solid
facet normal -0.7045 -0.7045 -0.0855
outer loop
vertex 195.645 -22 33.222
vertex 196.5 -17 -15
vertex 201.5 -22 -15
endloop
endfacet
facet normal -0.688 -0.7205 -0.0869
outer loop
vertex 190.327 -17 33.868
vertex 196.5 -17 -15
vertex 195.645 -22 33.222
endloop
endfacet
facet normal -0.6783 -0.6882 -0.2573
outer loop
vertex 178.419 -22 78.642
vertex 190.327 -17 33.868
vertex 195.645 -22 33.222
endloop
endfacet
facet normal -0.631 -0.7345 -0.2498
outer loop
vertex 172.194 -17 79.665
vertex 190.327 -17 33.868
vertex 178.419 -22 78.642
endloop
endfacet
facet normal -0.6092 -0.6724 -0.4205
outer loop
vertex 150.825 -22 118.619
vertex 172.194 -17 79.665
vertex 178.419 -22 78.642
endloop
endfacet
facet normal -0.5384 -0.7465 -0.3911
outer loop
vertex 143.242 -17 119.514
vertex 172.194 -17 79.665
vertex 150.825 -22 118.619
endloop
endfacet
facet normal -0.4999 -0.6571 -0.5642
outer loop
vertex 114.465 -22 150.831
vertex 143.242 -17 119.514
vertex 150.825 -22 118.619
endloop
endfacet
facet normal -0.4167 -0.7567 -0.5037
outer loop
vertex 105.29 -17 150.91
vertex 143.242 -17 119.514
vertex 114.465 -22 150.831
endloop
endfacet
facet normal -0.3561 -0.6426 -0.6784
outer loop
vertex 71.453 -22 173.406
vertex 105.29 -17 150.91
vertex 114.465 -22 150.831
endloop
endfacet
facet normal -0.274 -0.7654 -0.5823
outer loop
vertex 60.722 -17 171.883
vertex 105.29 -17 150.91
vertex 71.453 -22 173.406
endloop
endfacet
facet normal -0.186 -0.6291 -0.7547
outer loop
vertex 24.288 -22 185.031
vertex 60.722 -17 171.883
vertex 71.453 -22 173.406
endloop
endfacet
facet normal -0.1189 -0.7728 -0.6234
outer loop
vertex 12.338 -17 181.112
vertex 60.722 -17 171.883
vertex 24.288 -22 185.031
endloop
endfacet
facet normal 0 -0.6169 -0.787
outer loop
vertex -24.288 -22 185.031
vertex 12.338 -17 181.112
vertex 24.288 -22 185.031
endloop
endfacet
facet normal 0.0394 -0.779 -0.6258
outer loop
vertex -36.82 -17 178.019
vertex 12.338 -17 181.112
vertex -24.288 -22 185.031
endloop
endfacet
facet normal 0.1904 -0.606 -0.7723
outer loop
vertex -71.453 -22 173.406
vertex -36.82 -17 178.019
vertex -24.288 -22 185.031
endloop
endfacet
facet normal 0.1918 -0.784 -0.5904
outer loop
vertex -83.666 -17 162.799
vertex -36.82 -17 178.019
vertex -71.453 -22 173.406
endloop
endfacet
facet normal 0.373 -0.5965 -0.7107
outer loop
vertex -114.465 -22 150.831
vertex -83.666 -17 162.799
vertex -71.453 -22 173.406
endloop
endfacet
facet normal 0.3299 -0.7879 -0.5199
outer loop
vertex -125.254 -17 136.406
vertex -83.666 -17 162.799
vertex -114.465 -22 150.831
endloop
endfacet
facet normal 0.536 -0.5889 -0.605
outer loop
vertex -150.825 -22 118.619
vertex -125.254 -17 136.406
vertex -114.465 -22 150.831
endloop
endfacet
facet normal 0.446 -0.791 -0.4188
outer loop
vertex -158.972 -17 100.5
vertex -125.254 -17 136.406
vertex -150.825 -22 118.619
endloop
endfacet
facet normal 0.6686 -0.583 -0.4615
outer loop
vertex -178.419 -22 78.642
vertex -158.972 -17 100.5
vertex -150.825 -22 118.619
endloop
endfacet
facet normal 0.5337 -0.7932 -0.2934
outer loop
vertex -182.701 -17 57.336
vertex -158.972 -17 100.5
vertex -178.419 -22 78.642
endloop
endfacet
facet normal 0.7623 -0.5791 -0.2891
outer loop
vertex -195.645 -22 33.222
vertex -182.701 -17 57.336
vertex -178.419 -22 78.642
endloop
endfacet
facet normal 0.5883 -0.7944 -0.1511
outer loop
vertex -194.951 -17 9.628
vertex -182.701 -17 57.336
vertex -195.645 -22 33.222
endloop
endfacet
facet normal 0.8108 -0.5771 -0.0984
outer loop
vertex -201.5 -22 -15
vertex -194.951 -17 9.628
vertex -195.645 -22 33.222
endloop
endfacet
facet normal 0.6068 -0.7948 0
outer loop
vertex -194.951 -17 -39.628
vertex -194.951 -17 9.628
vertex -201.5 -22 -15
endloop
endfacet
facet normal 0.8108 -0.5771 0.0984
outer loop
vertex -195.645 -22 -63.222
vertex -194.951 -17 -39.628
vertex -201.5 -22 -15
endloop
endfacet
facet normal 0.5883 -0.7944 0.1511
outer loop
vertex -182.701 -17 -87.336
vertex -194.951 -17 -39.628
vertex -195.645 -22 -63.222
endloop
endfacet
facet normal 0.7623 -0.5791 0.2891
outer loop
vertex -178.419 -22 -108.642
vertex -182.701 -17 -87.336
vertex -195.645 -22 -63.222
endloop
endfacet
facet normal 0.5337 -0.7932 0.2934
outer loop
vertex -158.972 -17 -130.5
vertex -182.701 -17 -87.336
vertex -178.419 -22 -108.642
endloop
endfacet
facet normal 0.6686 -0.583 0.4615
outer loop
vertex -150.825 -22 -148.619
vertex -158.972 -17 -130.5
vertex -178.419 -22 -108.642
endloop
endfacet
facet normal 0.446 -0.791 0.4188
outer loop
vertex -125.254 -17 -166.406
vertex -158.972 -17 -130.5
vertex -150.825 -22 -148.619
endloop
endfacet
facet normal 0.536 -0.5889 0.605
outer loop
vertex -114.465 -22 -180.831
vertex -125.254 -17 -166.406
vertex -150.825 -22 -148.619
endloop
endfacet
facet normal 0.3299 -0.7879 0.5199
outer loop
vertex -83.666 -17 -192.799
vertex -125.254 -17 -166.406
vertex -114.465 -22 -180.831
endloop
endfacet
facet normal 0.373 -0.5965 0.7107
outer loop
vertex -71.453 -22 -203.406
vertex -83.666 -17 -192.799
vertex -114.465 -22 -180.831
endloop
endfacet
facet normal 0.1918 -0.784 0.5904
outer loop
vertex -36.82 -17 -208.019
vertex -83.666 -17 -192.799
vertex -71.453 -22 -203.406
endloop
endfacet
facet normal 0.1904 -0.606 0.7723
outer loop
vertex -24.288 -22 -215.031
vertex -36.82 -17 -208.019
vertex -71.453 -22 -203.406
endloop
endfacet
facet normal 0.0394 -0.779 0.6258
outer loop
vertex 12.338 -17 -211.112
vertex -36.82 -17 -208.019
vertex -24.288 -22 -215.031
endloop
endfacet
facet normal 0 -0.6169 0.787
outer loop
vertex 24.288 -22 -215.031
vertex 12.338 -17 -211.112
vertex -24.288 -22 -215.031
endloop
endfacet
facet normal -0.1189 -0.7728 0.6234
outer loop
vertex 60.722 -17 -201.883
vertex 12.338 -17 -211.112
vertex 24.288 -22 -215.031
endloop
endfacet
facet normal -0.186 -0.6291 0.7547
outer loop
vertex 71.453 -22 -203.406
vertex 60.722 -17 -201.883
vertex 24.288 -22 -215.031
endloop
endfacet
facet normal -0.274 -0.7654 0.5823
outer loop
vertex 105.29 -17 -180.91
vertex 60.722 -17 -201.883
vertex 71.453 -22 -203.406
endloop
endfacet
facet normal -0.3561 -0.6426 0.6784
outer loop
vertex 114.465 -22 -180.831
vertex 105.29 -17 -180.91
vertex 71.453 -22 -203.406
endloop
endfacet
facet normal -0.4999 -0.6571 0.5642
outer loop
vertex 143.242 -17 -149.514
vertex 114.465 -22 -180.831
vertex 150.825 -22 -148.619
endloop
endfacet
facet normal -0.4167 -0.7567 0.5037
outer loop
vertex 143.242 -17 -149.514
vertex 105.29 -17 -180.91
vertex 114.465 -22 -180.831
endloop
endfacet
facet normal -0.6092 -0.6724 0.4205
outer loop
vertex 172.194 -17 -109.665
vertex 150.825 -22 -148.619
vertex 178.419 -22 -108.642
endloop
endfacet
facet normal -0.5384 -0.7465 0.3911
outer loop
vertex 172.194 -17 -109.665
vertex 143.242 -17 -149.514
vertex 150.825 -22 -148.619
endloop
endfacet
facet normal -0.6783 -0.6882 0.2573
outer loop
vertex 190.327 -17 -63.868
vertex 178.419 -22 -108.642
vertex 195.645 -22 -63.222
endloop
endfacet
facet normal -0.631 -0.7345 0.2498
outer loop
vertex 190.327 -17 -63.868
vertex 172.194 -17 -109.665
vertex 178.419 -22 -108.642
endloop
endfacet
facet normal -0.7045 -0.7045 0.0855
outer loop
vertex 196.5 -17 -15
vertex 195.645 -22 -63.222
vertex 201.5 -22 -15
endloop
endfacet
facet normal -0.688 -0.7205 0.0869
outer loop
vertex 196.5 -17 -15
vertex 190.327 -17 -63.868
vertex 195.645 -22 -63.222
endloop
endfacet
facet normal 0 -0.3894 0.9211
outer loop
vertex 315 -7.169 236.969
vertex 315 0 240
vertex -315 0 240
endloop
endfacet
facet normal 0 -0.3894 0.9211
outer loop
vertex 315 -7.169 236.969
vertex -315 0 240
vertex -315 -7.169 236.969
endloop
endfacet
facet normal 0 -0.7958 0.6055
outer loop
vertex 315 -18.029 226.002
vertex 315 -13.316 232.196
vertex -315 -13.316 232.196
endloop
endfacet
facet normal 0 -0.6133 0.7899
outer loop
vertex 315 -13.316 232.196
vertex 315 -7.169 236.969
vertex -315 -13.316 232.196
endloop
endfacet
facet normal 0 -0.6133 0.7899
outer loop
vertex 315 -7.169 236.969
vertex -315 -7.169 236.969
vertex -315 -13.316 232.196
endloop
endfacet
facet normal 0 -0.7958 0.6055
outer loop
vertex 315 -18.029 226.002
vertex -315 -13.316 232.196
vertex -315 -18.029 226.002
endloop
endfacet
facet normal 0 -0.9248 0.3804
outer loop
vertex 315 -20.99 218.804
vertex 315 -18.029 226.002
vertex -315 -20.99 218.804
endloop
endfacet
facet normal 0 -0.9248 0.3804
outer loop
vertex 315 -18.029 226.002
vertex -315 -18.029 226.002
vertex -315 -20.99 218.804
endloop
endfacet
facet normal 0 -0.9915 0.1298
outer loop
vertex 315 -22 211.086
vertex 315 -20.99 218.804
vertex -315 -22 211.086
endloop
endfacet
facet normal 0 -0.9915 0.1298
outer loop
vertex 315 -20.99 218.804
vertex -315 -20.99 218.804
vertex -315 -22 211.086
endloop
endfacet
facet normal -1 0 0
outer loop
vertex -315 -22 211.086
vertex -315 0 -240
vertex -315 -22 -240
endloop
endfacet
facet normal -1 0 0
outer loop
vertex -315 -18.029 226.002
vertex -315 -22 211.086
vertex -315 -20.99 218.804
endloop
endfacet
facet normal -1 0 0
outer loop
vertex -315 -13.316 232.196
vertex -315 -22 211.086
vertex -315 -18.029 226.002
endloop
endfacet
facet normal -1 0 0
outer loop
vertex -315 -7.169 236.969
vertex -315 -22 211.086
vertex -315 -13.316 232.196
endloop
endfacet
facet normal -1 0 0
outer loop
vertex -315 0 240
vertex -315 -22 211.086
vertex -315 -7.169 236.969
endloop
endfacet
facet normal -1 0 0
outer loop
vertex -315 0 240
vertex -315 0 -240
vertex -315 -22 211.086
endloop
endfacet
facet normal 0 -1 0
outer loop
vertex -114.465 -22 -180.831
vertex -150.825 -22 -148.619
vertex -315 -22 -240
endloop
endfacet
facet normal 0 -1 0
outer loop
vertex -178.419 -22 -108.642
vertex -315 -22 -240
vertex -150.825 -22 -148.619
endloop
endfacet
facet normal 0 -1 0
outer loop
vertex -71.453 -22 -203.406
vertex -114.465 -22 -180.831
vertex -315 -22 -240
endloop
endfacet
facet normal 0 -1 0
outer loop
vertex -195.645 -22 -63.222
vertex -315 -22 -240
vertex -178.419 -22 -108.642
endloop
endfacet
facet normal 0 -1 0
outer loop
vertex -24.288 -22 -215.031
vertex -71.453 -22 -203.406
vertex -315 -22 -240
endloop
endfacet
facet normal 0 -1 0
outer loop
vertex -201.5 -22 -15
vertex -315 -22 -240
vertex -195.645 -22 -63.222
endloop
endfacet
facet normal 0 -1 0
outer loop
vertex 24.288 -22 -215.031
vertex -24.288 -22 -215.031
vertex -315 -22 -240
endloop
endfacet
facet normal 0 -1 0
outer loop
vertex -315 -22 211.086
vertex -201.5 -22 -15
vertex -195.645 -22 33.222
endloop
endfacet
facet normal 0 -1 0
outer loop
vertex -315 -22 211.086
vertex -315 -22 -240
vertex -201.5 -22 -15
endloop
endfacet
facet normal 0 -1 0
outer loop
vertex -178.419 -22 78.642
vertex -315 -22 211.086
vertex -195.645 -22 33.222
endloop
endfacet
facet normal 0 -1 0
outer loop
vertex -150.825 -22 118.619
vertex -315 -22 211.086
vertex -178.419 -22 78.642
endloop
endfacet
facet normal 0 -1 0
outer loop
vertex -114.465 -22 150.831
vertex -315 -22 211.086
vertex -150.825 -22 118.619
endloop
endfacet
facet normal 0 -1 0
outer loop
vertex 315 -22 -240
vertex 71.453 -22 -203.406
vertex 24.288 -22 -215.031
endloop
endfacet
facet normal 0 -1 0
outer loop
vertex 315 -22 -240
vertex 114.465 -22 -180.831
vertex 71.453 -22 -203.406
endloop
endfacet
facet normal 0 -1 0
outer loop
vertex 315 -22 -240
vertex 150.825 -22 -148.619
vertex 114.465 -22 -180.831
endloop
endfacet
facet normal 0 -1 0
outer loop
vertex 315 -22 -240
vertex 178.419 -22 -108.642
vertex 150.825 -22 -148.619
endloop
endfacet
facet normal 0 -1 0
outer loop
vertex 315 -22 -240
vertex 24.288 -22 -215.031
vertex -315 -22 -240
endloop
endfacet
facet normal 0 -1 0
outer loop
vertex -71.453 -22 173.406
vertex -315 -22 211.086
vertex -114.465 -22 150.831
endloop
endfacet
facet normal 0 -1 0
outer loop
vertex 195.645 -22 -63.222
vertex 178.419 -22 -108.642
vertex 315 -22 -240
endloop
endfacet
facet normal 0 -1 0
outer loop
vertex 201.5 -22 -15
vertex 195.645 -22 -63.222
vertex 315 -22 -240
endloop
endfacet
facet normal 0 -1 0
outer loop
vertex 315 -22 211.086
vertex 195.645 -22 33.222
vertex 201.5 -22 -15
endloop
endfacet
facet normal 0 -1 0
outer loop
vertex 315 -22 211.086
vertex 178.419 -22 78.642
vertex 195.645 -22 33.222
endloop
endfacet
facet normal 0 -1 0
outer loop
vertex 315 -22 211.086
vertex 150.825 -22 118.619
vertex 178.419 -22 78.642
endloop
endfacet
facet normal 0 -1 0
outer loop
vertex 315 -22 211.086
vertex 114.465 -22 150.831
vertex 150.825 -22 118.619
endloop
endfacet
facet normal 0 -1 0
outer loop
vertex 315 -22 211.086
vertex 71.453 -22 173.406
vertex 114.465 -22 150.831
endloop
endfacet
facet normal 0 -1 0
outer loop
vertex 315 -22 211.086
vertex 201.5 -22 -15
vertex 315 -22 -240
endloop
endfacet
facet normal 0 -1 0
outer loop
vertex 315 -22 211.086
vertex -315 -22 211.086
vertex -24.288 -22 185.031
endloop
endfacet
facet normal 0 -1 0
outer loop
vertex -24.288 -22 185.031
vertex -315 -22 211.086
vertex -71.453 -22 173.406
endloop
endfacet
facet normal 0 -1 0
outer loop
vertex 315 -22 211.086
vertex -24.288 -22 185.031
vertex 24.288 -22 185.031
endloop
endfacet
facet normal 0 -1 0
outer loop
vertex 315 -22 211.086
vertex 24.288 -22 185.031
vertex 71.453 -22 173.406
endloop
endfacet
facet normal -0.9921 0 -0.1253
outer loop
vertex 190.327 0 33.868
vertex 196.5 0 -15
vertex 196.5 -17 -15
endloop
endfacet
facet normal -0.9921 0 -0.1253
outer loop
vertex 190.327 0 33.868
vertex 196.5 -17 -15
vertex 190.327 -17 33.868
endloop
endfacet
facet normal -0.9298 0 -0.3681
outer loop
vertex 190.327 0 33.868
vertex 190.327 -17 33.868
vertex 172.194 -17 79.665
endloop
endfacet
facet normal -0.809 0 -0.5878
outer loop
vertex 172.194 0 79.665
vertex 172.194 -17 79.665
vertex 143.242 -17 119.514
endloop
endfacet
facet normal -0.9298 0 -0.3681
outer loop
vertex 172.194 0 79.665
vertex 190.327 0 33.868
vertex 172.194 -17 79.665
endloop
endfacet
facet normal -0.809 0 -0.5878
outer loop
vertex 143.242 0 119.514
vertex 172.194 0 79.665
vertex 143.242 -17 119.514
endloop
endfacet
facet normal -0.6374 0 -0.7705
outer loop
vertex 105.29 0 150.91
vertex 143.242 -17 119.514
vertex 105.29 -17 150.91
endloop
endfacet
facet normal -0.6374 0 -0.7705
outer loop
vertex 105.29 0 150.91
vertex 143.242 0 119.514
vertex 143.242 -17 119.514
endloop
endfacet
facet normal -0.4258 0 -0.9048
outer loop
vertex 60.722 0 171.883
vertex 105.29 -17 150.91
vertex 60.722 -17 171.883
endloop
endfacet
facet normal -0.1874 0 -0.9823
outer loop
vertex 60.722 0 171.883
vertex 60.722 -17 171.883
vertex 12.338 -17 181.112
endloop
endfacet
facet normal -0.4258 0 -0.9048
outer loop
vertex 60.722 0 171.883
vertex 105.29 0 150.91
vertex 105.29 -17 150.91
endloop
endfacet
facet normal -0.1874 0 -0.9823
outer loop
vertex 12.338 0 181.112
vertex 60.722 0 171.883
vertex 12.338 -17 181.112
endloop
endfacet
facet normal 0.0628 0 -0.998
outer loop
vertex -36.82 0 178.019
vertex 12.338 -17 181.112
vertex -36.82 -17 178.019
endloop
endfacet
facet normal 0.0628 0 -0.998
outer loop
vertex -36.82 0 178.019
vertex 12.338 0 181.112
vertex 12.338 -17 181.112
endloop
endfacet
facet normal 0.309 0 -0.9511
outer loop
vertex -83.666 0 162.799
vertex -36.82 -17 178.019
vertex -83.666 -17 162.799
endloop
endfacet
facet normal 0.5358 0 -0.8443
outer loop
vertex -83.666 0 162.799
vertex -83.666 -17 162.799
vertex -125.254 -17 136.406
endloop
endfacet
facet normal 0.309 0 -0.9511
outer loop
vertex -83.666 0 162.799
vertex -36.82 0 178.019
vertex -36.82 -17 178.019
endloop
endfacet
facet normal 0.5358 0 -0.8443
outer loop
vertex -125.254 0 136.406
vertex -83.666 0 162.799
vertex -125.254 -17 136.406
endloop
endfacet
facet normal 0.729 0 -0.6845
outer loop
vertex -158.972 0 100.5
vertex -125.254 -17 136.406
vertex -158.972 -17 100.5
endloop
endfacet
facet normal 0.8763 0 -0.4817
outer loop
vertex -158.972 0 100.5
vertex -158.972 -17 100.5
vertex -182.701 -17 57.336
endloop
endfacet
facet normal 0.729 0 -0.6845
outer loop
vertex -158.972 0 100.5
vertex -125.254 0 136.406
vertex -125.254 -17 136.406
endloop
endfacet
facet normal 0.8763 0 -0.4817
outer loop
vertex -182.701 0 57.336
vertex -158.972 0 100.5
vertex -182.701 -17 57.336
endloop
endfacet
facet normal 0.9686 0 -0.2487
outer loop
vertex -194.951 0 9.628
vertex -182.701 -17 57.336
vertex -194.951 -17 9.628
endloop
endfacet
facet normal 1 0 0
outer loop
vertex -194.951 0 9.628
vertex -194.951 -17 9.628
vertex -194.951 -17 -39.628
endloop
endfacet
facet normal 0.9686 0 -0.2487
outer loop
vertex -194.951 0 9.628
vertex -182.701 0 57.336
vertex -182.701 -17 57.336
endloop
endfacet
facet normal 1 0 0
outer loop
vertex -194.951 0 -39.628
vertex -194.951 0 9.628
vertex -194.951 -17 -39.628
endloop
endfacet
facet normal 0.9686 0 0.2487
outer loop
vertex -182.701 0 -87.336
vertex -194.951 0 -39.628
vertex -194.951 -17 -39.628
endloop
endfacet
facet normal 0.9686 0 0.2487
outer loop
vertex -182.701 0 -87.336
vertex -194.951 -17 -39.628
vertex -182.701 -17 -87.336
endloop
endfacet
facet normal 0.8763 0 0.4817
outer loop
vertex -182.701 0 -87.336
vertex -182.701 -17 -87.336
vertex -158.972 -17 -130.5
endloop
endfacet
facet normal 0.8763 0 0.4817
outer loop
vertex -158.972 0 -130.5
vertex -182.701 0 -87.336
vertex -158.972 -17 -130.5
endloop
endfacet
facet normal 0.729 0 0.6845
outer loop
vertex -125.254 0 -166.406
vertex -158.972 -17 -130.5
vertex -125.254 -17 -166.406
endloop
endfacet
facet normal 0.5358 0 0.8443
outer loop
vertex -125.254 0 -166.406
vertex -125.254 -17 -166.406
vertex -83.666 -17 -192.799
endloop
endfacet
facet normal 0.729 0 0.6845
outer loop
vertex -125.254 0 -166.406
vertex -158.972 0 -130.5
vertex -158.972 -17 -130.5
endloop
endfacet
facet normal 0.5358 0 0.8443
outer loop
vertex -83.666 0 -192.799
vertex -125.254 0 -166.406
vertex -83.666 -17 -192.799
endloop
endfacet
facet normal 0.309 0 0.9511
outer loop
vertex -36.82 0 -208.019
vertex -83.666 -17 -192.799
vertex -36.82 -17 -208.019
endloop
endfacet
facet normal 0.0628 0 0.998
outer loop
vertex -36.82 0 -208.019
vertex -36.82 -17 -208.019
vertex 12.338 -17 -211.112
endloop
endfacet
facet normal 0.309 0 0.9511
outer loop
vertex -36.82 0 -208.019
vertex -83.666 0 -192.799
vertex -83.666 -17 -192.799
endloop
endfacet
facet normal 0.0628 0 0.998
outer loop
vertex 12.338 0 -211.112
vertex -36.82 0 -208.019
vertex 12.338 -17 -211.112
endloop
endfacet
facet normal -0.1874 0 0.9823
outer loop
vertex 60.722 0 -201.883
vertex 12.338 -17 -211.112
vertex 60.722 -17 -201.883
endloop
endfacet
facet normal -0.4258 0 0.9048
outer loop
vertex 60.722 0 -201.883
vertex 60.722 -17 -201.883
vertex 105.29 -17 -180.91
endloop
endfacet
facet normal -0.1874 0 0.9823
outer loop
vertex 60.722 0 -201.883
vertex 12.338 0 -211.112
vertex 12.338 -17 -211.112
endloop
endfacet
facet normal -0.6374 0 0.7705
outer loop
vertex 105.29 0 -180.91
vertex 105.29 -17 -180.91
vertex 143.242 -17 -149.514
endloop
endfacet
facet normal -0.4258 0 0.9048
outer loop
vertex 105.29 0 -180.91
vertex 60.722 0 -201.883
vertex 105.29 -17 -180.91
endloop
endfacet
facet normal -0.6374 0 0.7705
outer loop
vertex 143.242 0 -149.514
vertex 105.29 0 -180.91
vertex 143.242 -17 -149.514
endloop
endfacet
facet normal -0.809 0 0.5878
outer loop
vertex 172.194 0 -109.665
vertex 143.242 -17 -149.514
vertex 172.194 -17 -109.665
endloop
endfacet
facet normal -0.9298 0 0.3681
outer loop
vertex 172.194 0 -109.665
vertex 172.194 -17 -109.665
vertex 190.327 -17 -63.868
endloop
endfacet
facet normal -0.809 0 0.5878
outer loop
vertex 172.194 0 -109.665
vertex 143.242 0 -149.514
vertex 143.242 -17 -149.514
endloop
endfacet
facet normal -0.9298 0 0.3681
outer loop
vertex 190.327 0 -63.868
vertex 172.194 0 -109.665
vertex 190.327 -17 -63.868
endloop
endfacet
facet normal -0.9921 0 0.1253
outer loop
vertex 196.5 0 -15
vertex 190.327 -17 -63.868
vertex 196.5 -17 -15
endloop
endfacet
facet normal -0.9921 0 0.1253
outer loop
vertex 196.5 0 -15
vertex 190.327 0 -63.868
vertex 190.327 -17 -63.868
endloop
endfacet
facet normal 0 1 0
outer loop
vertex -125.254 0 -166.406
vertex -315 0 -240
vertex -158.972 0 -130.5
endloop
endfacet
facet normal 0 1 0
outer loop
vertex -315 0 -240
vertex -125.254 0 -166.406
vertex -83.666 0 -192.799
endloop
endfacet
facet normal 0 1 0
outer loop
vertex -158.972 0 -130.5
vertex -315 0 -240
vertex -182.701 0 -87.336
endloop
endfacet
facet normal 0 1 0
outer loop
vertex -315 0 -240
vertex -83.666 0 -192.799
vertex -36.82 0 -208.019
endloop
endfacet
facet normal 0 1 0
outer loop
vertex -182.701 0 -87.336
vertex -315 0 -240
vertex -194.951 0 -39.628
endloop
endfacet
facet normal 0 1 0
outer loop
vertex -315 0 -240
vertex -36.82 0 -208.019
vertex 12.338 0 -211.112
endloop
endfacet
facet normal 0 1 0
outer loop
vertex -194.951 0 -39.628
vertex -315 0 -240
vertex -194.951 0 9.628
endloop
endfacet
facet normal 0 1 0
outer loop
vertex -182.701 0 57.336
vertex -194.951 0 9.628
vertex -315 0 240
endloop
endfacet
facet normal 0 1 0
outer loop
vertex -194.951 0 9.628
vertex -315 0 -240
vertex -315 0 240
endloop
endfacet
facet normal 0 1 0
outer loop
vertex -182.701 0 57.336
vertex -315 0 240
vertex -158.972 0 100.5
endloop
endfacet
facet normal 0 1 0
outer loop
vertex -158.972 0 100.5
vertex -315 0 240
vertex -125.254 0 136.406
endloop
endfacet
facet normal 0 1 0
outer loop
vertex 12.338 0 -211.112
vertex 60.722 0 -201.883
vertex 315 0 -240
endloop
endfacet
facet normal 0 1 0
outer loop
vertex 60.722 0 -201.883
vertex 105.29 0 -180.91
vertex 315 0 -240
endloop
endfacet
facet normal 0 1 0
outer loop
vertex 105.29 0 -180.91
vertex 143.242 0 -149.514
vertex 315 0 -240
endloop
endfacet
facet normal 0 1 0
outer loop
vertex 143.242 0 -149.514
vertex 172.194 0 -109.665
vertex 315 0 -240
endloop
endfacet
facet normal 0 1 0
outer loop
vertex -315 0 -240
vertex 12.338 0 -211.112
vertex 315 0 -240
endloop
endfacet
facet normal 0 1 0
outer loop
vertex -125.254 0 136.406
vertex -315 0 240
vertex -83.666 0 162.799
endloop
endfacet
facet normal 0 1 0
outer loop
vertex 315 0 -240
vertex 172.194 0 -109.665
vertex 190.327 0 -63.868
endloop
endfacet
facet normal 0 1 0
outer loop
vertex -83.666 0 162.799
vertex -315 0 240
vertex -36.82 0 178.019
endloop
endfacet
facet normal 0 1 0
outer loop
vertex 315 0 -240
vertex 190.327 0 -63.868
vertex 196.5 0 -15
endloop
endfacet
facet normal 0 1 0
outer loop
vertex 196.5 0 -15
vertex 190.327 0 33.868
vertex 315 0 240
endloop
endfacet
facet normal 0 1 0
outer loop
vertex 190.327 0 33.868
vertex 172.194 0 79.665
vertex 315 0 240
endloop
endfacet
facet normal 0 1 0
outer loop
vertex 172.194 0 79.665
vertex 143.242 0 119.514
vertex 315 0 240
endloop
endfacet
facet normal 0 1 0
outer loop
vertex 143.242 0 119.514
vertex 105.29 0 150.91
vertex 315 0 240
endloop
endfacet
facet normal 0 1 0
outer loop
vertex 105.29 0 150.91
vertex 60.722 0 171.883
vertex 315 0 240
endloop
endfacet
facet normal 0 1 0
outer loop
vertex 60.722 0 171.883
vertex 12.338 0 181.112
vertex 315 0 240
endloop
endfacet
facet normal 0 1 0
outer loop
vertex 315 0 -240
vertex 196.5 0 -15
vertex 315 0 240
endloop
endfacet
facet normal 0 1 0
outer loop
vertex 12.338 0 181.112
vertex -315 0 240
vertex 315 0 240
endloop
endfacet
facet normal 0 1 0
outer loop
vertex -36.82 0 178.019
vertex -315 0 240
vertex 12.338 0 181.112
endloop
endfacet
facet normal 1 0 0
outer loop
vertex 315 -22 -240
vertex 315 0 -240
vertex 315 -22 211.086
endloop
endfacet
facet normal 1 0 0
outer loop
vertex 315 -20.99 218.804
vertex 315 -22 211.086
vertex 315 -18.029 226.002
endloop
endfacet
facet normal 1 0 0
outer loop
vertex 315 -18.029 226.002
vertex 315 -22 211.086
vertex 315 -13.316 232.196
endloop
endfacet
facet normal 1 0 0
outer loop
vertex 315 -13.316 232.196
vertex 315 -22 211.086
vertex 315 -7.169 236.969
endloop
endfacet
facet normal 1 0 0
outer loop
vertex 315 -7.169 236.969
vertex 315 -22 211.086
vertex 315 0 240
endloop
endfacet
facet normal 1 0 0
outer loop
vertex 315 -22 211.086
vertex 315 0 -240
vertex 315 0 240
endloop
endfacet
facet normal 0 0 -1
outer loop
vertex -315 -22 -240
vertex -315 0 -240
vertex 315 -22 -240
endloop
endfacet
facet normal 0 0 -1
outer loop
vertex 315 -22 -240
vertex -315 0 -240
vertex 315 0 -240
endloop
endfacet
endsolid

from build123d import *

# Parameters (mm, degrees)
F0_W        = 630
F0_H        = 480
F0_R        = 196.5
F1_DEPTH    = 22
F2_T1_DEPTH = 774.568322948
F3_SIZE     = 5


# Not quite as in the source:
# - a fillet or chamfer that OpenCascade refuses, or shapes differently, is made with other operations: its cross-section is extruded or revolved along the edge and cut away or added


with BuildPart() as f1:
    # F0 (on Front) → F1 (new body)
    with BuildSketch(Plane.XZ):
        Rectangle(F0_W, F0_H)
        with Locations((0, -15)):
            Circle(F0_R, mode=Mode.SUBTRACT)
    extrude(amount=F1_DEPTH)

    # F2: fillet of radius 30 on 1 edges, made by hand

    # F2_s2 → F2_t1 (cut)
    with BuildSketch(Plane.YZ.offset(-387.284161474)):
        with BuildLine():
            ThreePointArc((0, 240), (-15.8746727726, 229.252237535), (-22, 211.0863354104))
            Line((-22, 211.0863354104), (-22, 240))
            Line((-22, 240), (0, 240))
        make_face()
    extrude(amount=F2_T1_DEPTH, mode=Mode.SUBTRACT)

    # F3
    f3_edges = [f1.edges().sort_by_distance(p)[0] for p in [
        (-196.5, -22, -15),
    ]]
    chamfer(f3_edges, length=F3_SIZE)


solid = f1.part
